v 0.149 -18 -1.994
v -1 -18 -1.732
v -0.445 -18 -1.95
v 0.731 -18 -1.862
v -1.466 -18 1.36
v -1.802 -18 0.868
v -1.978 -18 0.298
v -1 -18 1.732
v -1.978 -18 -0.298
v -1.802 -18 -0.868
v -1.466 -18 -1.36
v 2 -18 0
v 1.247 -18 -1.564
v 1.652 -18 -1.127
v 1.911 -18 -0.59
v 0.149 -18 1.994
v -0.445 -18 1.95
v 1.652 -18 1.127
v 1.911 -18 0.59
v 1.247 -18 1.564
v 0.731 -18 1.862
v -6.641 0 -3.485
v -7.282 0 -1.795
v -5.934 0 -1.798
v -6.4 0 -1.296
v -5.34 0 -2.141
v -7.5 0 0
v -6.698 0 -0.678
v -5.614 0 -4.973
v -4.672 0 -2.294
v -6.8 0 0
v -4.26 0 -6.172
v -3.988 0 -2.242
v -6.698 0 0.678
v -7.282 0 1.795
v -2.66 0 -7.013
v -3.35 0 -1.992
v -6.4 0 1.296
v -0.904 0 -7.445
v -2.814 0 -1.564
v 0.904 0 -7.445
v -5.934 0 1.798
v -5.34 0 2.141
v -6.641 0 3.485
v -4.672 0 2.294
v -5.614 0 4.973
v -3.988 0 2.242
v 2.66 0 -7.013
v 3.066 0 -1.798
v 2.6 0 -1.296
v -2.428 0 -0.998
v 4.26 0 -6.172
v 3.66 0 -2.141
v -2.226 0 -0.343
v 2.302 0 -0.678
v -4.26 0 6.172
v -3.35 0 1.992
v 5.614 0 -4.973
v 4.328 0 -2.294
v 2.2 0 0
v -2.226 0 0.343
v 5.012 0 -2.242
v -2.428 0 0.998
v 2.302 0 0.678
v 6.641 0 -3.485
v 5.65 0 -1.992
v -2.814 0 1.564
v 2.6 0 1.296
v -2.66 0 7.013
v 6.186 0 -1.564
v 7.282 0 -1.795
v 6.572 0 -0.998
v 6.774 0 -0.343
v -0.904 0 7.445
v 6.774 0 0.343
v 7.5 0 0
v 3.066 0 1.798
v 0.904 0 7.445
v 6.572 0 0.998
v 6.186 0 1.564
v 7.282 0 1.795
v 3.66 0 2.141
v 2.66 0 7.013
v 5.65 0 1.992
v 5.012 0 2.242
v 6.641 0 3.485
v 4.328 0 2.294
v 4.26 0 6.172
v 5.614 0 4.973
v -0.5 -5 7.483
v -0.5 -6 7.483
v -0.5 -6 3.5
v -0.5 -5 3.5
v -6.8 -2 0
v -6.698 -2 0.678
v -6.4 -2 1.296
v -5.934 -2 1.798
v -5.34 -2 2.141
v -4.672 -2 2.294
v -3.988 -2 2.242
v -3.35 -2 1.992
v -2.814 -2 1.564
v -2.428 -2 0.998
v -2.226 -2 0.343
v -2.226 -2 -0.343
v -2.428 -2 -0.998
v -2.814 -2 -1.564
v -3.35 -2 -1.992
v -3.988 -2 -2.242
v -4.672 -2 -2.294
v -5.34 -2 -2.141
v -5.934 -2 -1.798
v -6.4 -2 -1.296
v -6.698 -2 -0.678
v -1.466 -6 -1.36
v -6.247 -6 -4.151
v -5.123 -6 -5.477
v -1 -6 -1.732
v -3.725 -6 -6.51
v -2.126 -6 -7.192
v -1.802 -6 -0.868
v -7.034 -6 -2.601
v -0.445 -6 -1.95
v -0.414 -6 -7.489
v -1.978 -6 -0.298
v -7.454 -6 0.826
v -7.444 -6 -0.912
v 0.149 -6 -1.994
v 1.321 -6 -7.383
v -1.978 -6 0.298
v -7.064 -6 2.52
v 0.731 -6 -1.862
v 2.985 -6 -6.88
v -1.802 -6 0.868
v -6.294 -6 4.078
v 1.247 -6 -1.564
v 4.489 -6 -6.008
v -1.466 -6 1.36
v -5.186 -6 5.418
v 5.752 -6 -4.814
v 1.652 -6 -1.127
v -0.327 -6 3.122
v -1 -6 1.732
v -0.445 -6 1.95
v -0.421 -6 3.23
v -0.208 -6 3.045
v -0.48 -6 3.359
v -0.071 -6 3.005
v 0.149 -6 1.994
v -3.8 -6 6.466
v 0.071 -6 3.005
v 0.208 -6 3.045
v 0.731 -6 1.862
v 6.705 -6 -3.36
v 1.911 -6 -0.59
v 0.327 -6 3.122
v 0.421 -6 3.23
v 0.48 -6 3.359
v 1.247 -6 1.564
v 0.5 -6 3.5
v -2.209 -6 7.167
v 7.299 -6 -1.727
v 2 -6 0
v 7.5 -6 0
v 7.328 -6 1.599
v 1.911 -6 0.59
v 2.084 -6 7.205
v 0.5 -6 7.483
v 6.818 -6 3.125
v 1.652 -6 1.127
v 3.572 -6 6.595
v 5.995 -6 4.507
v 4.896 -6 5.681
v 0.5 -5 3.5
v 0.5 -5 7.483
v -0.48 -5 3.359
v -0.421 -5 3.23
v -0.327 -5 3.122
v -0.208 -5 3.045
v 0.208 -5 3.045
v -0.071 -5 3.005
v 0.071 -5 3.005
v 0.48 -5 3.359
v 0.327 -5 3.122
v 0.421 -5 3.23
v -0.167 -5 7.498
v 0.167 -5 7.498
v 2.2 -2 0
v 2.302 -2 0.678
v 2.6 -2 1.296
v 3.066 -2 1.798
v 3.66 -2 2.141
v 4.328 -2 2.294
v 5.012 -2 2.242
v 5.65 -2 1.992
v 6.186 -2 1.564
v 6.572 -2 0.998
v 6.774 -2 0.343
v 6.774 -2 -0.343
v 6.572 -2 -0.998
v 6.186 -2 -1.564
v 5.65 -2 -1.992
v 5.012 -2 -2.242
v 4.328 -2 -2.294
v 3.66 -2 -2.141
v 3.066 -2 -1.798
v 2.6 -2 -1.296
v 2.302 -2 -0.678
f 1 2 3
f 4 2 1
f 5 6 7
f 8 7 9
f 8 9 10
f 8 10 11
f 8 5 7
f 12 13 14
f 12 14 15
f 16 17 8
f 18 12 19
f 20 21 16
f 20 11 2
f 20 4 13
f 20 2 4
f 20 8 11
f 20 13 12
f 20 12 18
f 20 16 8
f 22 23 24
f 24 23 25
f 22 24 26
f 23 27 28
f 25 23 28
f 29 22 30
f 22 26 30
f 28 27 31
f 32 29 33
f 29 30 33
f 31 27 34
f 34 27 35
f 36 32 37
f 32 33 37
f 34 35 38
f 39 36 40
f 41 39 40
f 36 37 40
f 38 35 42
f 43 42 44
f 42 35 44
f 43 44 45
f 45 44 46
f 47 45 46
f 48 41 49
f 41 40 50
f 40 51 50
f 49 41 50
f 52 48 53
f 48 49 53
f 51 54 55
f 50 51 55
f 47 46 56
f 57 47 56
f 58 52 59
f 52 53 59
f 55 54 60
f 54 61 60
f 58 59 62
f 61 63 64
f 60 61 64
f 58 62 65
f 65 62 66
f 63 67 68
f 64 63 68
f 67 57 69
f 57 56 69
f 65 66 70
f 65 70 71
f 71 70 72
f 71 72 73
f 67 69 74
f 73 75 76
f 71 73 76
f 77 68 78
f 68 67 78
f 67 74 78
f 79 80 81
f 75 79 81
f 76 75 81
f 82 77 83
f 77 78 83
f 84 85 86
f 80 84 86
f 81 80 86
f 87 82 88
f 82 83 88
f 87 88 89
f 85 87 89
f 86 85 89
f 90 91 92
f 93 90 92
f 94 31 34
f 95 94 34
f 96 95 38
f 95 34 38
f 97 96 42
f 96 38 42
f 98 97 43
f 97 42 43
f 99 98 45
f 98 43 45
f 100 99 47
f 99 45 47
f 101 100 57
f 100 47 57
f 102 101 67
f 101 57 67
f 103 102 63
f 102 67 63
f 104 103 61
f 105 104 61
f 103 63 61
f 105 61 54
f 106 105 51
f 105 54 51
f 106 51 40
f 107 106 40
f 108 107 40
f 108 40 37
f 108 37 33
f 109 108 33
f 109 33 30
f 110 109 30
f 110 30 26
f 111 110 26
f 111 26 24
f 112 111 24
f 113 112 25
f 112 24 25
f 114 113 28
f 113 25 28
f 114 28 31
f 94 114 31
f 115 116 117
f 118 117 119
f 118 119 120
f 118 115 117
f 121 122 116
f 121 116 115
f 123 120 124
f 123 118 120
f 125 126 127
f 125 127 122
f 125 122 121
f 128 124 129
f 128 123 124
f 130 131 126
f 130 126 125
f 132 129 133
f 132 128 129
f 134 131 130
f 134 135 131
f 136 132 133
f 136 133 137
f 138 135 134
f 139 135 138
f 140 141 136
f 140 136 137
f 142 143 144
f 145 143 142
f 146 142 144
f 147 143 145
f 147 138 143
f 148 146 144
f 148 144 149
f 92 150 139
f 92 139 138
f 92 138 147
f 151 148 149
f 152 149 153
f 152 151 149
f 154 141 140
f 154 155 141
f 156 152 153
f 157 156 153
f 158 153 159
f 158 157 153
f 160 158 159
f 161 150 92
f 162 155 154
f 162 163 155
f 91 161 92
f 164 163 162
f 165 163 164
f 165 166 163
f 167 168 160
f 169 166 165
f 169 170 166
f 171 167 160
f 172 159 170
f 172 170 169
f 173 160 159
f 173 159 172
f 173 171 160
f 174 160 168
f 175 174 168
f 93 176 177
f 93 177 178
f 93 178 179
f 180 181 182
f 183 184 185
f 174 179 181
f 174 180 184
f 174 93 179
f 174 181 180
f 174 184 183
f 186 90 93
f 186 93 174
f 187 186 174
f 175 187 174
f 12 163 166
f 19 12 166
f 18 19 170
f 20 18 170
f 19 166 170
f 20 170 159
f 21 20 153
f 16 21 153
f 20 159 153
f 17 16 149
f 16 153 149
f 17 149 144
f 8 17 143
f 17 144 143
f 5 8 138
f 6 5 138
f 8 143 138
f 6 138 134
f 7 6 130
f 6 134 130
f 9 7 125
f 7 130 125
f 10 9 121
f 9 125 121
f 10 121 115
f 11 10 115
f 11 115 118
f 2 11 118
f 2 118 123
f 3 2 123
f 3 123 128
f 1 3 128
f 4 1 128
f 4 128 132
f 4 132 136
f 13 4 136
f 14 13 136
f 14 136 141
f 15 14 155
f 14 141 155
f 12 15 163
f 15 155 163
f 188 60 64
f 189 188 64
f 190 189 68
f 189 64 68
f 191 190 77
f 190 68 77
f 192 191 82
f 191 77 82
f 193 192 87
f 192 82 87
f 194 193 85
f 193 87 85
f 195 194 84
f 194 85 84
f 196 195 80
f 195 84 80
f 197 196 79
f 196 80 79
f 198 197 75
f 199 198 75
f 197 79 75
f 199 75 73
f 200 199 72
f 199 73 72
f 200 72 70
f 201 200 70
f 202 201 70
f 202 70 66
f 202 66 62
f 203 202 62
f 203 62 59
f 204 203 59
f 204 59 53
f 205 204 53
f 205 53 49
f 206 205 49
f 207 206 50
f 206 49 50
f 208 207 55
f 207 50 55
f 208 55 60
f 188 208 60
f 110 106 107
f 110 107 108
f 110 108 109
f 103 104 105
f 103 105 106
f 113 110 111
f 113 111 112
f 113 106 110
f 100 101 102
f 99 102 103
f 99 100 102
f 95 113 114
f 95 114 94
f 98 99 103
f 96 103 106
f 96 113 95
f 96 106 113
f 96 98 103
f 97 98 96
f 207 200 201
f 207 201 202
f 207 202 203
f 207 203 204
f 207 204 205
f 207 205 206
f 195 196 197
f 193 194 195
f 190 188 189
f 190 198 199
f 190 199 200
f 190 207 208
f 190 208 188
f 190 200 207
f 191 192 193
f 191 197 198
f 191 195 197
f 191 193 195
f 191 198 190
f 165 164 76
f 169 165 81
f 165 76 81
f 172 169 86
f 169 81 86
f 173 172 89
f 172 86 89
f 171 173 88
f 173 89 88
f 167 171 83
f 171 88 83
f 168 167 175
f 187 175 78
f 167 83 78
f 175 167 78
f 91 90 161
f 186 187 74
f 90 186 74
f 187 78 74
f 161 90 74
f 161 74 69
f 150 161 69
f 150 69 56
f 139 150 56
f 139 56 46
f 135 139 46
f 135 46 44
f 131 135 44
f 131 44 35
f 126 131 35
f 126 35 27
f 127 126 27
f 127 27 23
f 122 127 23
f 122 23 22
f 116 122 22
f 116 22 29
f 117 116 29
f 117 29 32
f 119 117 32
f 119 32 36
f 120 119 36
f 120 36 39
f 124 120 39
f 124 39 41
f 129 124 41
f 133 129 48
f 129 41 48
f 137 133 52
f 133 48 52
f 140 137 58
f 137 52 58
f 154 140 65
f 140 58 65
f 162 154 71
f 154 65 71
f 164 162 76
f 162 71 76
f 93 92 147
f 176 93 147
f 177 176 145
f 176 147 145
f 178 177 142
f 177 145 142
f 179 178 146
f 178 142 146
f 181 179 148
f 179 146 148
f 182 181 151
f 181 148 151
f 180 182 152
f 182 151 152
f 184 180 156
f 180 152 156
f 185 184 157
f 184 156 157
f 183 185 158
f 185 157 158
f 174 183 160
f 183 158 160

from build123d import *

# Parameters (mm, degrees)
F0_R     = 7.5
F1_DEPTH = 6
F2_R     = 2
F3_DEPTH = 12
F4_R     = 2.3
F5_DEPTH = 2
F7_DEPTH = 1


with BuildPart() as f1:
    # F0 (on Front) → F1 (new body)
    with BuildSketch(Plane.XZ):
        Circle(F0_R)
    extrude(amount=F1_DEPTH)

    # F2 (on face) → F3 (join)
    with BuildSketch(Plane.XZ.offset(6)):
        Circle(F2_R)
    extrude(amount=F3_DEPTH)

    # F4 (on face) → F5 (cut)
    with BuildSketch(Plane(origin=(0, 0, 0), x_dir=(-1, 0, 0), z_dir=(0, 1, 0))):
        with Locations((-4.5, 0)):
            Circle(F4_R)
        with Locations((4.5, 0)):
            Circle(F4_R)
    extrude(amount=-F5_DEPTH, mode=Mode.SUBTRACT)

    # F6 (on face) → F7 (cut)
    with BuildSketch(Plane.XZ.offset(6)):
        with BuildLine():
            Line((0.5, 3.5), (0.5, 7.4833147735))
            ThreePointArc((0.5, 7.4833147735), (0, 7.5), (-0.5, 7.4833147735))
            Line((-0.5, 7.4833147735), (-0.5, 3.5))
            ThreePointArc((-0.5, 3.5), (0, 3), (0.5, 3.5))
        make_face()
    extrude(amount=-F7_DEPTH, mode=Mode.SUBTRACT)


solid = f1.part
